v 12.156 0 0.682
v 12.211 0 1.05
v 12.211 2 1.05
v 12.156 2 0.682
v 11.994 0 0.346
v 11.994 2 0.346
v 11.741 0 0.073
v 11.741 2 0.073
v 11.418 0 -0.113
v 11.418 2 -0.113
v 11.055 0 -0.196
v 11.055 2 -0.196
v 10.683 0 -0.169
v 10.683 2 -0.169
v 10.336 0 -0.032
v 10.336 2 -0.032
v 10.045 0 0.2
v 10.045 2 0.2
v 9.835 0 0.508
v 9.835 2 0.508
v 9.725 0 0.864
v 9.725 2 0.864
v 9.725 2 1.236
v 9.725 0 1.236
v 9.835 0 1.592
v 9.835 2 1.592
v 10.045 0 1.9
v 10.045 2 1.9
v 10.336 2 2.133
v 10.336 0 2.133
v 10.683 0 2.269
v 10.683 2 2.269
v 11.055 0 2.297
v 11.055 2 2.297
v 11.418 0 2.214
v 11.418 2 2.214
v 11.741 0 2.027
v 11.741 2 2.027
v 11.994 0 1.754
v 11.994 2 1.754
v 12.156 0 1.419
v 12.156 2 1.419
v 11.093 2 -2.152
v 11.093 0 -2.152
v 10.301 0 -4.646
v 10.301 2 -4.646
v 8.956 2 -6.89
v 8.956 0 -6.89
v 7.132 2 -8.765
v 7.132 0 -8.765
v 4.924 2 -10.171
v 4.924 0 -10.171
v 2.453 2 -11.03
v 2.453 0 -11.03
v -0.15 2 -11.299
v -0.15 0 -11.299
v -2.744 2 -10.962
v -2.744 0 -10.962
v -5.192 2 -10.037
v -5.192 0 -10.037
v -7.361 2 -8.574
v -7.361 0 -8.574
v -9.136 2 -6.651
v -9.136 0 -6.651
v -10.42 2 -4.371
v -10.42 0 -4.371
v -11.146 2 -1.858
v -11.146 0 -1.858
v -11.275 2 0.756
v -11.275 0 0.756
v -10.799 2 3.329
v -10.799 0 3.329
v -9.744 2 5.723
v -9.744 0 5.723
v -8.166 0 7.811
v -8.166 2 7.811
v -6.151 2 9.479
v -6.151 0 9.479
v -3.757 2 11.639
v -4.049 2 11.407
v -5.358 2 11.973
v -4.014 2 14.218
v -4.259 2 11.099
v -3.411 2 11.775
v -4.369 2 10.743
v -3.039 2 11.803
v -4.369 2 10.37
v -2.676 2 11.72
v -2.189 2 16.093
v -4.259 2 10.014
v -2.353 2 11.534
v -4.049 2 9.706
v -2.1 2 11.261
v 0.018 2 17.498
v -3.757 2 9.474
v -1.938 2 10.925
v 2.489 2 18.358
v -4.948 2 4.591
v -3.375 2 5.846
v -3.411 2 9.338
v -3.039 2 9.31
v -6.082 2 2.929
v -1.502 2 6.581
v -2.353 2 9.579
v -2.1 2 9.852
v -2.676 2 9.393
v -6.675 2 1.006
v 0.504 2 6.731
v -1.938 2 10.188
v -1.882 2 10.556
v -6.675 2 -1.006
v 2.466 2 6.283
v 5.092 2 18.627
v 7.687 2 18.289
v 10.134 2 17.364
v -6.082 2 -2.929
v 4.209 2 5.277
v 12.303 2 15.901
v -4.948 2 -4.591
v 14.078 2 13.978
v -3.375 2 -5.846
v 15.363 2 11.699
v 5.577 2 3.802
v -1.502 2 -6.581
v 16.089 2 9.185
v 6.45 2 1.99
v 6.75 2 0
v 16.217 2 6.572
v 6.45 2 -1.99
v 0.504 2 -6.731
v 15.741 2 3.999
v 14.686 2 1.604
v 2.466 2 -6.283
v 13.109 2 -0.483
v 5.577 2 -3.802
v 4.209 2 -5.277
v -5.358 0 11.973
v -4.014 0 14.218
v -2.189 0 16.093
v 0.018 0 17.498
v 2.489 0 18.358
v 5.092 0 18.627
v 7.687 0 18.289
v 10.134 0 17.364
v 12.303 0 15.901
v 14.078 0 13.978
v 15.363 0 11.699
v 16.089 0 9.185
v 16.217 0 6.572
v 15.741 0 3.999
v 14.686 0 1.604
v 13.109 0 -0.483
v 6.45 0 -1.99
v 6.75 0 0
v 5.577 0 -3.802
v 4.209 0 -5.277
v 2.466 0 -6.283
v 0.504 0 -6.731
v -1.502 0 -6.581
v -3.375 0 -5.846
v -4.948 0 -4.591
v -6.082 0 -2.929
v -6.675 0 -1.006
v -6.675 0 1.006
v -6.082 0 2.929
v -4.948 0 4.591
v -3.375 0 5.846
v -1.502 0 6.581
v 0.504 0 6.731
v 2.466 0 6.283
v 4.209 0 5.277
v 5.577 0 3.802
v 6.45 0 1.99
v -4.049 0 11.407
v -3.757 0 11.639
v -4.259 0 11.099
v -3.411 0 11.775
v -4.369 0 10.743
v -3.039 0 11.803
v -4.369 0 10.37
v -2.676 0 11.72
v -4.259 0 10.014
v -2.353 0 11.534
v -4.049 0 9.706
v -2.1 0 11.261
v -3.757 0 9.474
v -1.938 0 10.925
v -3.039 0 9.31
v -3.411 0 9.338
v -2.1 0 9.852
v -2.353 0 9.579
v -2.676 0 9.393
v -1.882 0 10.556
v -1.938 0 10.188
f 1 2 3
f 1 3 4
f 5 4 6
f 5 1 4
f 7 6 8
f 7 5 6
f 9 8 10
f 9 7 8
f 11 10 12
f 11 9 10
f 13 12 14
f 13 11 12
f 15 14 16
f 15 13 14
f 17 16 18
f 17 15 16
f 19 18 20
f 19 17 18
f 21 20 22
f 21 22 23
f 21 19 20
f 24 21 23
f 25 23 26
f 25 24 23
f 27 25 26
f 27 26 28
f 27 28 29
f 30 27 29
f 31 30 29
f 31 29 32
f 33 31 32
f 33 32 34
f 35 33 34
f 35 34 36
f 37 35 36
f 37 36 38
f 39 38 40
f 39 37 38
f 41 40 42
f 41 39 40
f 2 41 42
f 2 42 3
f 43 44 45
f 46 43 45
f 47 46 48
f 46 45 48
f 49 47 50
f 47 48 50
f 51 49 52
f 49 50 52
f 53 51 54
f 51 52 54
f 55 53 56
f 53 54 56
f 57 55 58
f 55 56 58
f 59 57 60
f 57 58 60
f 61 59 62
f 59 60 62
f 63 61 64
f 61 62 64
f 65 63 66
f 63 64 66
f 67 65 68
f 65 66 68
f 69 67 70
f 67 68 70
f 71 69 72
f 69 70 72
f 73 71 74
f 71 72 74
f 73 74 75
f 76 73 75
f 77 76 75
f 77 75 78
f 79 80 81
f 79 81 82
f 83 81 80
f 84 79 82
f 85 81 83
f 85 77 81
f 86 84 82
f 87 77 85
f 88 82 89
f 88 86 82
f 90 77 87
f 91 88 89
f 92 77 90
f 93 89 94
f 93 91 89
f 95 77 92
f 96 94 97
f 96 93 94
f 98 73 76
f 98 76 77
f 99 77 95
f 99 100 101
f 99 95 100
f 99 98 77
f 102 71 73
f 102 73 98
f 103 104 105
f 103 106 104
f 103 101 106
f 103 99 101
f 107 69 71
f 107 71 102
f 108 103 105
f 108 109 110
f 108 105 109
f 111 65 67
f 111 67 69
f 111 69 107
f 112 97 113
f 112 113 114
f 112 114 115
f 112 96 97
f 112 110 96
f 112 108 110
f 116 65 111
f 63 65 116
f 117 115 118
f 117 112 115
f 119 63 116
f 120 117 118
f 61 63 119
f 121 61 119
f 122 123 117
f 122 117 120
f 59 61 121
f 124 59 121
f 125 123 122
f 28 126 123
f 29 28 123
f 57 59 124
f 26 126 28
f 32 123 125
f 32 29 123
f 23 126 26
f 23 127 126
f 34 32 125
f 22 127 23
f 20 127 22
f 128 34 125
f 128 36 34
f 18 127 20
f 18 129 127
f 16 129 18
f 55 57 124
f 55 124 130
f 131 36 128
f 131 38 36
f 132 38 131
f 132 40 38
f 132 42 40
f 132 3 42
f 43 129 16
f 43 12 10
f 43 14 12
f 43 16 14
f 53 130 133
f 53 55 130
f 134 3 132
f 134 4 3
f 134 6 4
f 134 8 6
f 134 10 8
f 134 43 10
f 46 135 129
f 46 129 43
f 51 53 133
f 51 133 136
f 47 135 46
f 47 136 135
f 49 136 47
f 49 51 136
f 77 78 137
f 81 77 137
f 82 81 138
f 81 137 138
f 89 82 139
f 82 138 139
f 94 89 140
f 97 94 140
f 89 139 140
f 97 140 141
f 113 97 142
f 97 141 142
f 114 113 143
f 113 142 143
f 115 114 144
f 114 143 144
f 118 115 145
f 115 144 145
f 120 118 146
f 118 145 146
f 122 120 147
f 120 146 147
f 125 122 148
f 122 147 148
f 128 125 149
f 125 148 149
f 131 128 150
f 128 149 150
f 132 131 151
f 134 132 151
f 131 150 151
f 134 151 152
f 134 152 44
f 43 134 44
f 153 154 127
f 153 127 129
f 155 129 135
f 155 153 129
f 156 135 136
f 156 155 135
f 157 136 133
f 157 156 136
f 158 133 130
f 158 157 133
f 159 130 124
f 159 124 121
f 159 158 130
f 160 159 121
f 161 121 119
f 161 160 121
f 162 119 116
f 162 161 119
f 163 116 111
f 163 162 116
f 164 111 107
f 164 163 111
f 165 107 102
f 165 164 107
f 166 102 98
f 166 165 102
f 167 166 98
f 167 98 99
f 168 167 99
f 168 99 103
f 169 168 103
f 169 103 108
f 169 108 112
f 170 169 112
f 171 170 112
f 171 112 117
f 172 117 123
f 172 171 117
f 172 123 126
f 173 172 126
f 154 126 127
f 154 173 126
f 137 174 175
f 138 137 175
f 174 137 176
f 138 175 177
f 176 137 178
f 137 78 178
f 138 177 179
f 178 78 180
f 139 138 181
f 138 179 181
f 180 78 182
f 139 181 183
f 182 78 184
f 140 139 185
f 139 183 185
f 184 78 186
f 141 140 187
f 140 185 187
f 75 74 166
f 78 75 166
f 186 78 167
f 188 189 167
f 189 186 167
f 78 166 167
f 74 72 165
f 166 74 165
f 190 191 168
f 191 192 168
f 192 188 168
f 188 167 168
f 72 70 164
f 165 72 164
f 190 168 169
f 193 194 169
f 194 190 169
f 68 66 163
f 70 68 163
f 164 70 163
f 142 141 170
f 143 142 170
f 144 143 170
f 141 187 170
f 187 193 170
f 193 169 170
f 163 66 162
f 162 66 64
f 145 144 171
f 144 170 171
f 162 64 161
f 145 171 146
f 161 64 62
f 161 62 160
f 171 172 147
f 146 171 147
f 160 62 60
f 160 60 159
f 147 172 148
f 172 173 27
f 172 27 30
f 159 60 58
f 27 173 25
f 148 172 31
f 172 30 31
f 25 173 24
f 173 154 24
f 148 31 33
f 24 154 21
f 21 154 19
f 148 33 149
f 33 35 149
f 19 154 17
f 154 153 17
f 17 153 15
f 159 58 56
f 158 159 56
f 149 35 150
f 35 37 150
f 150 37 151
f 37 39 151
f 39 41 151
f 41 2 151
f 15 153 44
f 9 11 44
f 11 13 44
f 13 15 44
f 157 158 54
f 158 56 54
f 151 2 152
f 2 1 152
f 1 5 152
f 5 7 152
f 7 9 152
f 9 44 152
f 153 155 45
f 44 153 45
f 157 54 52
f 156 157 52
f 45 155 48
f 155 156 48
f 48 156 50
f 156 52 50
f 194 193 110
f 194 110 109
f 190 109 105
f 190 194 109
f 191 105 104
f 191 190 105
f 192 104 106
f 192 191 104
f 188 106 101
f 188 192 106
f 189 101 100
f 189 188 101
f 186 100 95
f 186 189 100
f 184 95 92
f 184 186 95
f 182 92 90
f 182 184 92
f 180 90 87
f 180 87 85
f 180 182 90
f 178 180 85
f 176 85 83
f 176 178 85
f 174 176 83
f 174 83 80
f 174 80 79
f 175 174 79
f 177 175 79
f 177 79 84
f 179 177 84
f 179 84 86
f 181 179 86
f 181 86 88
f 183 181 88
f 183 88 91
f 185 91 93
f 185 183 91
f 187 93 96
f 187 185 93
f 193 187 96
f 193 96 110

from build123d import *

# Parameters (mm, degrees)
SKETCH_1_R      = 6.75
SKETCH_1_R_2    = 1.25
EXTRUDE_1_DEPTH = 2


with BuildPart() as part:
    # 草图1 → 凸台-拉伸1 (new body)
    with BuildSketch(Plane(origin=(0, 0, 0), x_dir=(1, 0, 0), z_dir=(0, 1, 0))):
        with BuildLine():
            ThreePointArc((11.093218509, 2.151860383), (-6.318879809, 9.36812457), (-6.150763, -9.479352009))
            ThreePointArc((-6.150763, -9.479352009), (11.261335318, -16.695616197), (11.093218509, 2.151860383))
        make_face()
        Circle(SKETCH_1_R, mode=Mode.SUBTRACT)
        with Locations((-3.132469042, -10.556402687)):
            Circle(SKETCH_1_R_2, mode=Mode.SUBTRACT)
        with Locations((10.961169691, -1.050123328)):
            Circle(SKETCH_1_R_2, mode=Mode.SUBTRACT)
    extrude(amount=EXTRUDE_1_DEPTH)


solid = part.part
